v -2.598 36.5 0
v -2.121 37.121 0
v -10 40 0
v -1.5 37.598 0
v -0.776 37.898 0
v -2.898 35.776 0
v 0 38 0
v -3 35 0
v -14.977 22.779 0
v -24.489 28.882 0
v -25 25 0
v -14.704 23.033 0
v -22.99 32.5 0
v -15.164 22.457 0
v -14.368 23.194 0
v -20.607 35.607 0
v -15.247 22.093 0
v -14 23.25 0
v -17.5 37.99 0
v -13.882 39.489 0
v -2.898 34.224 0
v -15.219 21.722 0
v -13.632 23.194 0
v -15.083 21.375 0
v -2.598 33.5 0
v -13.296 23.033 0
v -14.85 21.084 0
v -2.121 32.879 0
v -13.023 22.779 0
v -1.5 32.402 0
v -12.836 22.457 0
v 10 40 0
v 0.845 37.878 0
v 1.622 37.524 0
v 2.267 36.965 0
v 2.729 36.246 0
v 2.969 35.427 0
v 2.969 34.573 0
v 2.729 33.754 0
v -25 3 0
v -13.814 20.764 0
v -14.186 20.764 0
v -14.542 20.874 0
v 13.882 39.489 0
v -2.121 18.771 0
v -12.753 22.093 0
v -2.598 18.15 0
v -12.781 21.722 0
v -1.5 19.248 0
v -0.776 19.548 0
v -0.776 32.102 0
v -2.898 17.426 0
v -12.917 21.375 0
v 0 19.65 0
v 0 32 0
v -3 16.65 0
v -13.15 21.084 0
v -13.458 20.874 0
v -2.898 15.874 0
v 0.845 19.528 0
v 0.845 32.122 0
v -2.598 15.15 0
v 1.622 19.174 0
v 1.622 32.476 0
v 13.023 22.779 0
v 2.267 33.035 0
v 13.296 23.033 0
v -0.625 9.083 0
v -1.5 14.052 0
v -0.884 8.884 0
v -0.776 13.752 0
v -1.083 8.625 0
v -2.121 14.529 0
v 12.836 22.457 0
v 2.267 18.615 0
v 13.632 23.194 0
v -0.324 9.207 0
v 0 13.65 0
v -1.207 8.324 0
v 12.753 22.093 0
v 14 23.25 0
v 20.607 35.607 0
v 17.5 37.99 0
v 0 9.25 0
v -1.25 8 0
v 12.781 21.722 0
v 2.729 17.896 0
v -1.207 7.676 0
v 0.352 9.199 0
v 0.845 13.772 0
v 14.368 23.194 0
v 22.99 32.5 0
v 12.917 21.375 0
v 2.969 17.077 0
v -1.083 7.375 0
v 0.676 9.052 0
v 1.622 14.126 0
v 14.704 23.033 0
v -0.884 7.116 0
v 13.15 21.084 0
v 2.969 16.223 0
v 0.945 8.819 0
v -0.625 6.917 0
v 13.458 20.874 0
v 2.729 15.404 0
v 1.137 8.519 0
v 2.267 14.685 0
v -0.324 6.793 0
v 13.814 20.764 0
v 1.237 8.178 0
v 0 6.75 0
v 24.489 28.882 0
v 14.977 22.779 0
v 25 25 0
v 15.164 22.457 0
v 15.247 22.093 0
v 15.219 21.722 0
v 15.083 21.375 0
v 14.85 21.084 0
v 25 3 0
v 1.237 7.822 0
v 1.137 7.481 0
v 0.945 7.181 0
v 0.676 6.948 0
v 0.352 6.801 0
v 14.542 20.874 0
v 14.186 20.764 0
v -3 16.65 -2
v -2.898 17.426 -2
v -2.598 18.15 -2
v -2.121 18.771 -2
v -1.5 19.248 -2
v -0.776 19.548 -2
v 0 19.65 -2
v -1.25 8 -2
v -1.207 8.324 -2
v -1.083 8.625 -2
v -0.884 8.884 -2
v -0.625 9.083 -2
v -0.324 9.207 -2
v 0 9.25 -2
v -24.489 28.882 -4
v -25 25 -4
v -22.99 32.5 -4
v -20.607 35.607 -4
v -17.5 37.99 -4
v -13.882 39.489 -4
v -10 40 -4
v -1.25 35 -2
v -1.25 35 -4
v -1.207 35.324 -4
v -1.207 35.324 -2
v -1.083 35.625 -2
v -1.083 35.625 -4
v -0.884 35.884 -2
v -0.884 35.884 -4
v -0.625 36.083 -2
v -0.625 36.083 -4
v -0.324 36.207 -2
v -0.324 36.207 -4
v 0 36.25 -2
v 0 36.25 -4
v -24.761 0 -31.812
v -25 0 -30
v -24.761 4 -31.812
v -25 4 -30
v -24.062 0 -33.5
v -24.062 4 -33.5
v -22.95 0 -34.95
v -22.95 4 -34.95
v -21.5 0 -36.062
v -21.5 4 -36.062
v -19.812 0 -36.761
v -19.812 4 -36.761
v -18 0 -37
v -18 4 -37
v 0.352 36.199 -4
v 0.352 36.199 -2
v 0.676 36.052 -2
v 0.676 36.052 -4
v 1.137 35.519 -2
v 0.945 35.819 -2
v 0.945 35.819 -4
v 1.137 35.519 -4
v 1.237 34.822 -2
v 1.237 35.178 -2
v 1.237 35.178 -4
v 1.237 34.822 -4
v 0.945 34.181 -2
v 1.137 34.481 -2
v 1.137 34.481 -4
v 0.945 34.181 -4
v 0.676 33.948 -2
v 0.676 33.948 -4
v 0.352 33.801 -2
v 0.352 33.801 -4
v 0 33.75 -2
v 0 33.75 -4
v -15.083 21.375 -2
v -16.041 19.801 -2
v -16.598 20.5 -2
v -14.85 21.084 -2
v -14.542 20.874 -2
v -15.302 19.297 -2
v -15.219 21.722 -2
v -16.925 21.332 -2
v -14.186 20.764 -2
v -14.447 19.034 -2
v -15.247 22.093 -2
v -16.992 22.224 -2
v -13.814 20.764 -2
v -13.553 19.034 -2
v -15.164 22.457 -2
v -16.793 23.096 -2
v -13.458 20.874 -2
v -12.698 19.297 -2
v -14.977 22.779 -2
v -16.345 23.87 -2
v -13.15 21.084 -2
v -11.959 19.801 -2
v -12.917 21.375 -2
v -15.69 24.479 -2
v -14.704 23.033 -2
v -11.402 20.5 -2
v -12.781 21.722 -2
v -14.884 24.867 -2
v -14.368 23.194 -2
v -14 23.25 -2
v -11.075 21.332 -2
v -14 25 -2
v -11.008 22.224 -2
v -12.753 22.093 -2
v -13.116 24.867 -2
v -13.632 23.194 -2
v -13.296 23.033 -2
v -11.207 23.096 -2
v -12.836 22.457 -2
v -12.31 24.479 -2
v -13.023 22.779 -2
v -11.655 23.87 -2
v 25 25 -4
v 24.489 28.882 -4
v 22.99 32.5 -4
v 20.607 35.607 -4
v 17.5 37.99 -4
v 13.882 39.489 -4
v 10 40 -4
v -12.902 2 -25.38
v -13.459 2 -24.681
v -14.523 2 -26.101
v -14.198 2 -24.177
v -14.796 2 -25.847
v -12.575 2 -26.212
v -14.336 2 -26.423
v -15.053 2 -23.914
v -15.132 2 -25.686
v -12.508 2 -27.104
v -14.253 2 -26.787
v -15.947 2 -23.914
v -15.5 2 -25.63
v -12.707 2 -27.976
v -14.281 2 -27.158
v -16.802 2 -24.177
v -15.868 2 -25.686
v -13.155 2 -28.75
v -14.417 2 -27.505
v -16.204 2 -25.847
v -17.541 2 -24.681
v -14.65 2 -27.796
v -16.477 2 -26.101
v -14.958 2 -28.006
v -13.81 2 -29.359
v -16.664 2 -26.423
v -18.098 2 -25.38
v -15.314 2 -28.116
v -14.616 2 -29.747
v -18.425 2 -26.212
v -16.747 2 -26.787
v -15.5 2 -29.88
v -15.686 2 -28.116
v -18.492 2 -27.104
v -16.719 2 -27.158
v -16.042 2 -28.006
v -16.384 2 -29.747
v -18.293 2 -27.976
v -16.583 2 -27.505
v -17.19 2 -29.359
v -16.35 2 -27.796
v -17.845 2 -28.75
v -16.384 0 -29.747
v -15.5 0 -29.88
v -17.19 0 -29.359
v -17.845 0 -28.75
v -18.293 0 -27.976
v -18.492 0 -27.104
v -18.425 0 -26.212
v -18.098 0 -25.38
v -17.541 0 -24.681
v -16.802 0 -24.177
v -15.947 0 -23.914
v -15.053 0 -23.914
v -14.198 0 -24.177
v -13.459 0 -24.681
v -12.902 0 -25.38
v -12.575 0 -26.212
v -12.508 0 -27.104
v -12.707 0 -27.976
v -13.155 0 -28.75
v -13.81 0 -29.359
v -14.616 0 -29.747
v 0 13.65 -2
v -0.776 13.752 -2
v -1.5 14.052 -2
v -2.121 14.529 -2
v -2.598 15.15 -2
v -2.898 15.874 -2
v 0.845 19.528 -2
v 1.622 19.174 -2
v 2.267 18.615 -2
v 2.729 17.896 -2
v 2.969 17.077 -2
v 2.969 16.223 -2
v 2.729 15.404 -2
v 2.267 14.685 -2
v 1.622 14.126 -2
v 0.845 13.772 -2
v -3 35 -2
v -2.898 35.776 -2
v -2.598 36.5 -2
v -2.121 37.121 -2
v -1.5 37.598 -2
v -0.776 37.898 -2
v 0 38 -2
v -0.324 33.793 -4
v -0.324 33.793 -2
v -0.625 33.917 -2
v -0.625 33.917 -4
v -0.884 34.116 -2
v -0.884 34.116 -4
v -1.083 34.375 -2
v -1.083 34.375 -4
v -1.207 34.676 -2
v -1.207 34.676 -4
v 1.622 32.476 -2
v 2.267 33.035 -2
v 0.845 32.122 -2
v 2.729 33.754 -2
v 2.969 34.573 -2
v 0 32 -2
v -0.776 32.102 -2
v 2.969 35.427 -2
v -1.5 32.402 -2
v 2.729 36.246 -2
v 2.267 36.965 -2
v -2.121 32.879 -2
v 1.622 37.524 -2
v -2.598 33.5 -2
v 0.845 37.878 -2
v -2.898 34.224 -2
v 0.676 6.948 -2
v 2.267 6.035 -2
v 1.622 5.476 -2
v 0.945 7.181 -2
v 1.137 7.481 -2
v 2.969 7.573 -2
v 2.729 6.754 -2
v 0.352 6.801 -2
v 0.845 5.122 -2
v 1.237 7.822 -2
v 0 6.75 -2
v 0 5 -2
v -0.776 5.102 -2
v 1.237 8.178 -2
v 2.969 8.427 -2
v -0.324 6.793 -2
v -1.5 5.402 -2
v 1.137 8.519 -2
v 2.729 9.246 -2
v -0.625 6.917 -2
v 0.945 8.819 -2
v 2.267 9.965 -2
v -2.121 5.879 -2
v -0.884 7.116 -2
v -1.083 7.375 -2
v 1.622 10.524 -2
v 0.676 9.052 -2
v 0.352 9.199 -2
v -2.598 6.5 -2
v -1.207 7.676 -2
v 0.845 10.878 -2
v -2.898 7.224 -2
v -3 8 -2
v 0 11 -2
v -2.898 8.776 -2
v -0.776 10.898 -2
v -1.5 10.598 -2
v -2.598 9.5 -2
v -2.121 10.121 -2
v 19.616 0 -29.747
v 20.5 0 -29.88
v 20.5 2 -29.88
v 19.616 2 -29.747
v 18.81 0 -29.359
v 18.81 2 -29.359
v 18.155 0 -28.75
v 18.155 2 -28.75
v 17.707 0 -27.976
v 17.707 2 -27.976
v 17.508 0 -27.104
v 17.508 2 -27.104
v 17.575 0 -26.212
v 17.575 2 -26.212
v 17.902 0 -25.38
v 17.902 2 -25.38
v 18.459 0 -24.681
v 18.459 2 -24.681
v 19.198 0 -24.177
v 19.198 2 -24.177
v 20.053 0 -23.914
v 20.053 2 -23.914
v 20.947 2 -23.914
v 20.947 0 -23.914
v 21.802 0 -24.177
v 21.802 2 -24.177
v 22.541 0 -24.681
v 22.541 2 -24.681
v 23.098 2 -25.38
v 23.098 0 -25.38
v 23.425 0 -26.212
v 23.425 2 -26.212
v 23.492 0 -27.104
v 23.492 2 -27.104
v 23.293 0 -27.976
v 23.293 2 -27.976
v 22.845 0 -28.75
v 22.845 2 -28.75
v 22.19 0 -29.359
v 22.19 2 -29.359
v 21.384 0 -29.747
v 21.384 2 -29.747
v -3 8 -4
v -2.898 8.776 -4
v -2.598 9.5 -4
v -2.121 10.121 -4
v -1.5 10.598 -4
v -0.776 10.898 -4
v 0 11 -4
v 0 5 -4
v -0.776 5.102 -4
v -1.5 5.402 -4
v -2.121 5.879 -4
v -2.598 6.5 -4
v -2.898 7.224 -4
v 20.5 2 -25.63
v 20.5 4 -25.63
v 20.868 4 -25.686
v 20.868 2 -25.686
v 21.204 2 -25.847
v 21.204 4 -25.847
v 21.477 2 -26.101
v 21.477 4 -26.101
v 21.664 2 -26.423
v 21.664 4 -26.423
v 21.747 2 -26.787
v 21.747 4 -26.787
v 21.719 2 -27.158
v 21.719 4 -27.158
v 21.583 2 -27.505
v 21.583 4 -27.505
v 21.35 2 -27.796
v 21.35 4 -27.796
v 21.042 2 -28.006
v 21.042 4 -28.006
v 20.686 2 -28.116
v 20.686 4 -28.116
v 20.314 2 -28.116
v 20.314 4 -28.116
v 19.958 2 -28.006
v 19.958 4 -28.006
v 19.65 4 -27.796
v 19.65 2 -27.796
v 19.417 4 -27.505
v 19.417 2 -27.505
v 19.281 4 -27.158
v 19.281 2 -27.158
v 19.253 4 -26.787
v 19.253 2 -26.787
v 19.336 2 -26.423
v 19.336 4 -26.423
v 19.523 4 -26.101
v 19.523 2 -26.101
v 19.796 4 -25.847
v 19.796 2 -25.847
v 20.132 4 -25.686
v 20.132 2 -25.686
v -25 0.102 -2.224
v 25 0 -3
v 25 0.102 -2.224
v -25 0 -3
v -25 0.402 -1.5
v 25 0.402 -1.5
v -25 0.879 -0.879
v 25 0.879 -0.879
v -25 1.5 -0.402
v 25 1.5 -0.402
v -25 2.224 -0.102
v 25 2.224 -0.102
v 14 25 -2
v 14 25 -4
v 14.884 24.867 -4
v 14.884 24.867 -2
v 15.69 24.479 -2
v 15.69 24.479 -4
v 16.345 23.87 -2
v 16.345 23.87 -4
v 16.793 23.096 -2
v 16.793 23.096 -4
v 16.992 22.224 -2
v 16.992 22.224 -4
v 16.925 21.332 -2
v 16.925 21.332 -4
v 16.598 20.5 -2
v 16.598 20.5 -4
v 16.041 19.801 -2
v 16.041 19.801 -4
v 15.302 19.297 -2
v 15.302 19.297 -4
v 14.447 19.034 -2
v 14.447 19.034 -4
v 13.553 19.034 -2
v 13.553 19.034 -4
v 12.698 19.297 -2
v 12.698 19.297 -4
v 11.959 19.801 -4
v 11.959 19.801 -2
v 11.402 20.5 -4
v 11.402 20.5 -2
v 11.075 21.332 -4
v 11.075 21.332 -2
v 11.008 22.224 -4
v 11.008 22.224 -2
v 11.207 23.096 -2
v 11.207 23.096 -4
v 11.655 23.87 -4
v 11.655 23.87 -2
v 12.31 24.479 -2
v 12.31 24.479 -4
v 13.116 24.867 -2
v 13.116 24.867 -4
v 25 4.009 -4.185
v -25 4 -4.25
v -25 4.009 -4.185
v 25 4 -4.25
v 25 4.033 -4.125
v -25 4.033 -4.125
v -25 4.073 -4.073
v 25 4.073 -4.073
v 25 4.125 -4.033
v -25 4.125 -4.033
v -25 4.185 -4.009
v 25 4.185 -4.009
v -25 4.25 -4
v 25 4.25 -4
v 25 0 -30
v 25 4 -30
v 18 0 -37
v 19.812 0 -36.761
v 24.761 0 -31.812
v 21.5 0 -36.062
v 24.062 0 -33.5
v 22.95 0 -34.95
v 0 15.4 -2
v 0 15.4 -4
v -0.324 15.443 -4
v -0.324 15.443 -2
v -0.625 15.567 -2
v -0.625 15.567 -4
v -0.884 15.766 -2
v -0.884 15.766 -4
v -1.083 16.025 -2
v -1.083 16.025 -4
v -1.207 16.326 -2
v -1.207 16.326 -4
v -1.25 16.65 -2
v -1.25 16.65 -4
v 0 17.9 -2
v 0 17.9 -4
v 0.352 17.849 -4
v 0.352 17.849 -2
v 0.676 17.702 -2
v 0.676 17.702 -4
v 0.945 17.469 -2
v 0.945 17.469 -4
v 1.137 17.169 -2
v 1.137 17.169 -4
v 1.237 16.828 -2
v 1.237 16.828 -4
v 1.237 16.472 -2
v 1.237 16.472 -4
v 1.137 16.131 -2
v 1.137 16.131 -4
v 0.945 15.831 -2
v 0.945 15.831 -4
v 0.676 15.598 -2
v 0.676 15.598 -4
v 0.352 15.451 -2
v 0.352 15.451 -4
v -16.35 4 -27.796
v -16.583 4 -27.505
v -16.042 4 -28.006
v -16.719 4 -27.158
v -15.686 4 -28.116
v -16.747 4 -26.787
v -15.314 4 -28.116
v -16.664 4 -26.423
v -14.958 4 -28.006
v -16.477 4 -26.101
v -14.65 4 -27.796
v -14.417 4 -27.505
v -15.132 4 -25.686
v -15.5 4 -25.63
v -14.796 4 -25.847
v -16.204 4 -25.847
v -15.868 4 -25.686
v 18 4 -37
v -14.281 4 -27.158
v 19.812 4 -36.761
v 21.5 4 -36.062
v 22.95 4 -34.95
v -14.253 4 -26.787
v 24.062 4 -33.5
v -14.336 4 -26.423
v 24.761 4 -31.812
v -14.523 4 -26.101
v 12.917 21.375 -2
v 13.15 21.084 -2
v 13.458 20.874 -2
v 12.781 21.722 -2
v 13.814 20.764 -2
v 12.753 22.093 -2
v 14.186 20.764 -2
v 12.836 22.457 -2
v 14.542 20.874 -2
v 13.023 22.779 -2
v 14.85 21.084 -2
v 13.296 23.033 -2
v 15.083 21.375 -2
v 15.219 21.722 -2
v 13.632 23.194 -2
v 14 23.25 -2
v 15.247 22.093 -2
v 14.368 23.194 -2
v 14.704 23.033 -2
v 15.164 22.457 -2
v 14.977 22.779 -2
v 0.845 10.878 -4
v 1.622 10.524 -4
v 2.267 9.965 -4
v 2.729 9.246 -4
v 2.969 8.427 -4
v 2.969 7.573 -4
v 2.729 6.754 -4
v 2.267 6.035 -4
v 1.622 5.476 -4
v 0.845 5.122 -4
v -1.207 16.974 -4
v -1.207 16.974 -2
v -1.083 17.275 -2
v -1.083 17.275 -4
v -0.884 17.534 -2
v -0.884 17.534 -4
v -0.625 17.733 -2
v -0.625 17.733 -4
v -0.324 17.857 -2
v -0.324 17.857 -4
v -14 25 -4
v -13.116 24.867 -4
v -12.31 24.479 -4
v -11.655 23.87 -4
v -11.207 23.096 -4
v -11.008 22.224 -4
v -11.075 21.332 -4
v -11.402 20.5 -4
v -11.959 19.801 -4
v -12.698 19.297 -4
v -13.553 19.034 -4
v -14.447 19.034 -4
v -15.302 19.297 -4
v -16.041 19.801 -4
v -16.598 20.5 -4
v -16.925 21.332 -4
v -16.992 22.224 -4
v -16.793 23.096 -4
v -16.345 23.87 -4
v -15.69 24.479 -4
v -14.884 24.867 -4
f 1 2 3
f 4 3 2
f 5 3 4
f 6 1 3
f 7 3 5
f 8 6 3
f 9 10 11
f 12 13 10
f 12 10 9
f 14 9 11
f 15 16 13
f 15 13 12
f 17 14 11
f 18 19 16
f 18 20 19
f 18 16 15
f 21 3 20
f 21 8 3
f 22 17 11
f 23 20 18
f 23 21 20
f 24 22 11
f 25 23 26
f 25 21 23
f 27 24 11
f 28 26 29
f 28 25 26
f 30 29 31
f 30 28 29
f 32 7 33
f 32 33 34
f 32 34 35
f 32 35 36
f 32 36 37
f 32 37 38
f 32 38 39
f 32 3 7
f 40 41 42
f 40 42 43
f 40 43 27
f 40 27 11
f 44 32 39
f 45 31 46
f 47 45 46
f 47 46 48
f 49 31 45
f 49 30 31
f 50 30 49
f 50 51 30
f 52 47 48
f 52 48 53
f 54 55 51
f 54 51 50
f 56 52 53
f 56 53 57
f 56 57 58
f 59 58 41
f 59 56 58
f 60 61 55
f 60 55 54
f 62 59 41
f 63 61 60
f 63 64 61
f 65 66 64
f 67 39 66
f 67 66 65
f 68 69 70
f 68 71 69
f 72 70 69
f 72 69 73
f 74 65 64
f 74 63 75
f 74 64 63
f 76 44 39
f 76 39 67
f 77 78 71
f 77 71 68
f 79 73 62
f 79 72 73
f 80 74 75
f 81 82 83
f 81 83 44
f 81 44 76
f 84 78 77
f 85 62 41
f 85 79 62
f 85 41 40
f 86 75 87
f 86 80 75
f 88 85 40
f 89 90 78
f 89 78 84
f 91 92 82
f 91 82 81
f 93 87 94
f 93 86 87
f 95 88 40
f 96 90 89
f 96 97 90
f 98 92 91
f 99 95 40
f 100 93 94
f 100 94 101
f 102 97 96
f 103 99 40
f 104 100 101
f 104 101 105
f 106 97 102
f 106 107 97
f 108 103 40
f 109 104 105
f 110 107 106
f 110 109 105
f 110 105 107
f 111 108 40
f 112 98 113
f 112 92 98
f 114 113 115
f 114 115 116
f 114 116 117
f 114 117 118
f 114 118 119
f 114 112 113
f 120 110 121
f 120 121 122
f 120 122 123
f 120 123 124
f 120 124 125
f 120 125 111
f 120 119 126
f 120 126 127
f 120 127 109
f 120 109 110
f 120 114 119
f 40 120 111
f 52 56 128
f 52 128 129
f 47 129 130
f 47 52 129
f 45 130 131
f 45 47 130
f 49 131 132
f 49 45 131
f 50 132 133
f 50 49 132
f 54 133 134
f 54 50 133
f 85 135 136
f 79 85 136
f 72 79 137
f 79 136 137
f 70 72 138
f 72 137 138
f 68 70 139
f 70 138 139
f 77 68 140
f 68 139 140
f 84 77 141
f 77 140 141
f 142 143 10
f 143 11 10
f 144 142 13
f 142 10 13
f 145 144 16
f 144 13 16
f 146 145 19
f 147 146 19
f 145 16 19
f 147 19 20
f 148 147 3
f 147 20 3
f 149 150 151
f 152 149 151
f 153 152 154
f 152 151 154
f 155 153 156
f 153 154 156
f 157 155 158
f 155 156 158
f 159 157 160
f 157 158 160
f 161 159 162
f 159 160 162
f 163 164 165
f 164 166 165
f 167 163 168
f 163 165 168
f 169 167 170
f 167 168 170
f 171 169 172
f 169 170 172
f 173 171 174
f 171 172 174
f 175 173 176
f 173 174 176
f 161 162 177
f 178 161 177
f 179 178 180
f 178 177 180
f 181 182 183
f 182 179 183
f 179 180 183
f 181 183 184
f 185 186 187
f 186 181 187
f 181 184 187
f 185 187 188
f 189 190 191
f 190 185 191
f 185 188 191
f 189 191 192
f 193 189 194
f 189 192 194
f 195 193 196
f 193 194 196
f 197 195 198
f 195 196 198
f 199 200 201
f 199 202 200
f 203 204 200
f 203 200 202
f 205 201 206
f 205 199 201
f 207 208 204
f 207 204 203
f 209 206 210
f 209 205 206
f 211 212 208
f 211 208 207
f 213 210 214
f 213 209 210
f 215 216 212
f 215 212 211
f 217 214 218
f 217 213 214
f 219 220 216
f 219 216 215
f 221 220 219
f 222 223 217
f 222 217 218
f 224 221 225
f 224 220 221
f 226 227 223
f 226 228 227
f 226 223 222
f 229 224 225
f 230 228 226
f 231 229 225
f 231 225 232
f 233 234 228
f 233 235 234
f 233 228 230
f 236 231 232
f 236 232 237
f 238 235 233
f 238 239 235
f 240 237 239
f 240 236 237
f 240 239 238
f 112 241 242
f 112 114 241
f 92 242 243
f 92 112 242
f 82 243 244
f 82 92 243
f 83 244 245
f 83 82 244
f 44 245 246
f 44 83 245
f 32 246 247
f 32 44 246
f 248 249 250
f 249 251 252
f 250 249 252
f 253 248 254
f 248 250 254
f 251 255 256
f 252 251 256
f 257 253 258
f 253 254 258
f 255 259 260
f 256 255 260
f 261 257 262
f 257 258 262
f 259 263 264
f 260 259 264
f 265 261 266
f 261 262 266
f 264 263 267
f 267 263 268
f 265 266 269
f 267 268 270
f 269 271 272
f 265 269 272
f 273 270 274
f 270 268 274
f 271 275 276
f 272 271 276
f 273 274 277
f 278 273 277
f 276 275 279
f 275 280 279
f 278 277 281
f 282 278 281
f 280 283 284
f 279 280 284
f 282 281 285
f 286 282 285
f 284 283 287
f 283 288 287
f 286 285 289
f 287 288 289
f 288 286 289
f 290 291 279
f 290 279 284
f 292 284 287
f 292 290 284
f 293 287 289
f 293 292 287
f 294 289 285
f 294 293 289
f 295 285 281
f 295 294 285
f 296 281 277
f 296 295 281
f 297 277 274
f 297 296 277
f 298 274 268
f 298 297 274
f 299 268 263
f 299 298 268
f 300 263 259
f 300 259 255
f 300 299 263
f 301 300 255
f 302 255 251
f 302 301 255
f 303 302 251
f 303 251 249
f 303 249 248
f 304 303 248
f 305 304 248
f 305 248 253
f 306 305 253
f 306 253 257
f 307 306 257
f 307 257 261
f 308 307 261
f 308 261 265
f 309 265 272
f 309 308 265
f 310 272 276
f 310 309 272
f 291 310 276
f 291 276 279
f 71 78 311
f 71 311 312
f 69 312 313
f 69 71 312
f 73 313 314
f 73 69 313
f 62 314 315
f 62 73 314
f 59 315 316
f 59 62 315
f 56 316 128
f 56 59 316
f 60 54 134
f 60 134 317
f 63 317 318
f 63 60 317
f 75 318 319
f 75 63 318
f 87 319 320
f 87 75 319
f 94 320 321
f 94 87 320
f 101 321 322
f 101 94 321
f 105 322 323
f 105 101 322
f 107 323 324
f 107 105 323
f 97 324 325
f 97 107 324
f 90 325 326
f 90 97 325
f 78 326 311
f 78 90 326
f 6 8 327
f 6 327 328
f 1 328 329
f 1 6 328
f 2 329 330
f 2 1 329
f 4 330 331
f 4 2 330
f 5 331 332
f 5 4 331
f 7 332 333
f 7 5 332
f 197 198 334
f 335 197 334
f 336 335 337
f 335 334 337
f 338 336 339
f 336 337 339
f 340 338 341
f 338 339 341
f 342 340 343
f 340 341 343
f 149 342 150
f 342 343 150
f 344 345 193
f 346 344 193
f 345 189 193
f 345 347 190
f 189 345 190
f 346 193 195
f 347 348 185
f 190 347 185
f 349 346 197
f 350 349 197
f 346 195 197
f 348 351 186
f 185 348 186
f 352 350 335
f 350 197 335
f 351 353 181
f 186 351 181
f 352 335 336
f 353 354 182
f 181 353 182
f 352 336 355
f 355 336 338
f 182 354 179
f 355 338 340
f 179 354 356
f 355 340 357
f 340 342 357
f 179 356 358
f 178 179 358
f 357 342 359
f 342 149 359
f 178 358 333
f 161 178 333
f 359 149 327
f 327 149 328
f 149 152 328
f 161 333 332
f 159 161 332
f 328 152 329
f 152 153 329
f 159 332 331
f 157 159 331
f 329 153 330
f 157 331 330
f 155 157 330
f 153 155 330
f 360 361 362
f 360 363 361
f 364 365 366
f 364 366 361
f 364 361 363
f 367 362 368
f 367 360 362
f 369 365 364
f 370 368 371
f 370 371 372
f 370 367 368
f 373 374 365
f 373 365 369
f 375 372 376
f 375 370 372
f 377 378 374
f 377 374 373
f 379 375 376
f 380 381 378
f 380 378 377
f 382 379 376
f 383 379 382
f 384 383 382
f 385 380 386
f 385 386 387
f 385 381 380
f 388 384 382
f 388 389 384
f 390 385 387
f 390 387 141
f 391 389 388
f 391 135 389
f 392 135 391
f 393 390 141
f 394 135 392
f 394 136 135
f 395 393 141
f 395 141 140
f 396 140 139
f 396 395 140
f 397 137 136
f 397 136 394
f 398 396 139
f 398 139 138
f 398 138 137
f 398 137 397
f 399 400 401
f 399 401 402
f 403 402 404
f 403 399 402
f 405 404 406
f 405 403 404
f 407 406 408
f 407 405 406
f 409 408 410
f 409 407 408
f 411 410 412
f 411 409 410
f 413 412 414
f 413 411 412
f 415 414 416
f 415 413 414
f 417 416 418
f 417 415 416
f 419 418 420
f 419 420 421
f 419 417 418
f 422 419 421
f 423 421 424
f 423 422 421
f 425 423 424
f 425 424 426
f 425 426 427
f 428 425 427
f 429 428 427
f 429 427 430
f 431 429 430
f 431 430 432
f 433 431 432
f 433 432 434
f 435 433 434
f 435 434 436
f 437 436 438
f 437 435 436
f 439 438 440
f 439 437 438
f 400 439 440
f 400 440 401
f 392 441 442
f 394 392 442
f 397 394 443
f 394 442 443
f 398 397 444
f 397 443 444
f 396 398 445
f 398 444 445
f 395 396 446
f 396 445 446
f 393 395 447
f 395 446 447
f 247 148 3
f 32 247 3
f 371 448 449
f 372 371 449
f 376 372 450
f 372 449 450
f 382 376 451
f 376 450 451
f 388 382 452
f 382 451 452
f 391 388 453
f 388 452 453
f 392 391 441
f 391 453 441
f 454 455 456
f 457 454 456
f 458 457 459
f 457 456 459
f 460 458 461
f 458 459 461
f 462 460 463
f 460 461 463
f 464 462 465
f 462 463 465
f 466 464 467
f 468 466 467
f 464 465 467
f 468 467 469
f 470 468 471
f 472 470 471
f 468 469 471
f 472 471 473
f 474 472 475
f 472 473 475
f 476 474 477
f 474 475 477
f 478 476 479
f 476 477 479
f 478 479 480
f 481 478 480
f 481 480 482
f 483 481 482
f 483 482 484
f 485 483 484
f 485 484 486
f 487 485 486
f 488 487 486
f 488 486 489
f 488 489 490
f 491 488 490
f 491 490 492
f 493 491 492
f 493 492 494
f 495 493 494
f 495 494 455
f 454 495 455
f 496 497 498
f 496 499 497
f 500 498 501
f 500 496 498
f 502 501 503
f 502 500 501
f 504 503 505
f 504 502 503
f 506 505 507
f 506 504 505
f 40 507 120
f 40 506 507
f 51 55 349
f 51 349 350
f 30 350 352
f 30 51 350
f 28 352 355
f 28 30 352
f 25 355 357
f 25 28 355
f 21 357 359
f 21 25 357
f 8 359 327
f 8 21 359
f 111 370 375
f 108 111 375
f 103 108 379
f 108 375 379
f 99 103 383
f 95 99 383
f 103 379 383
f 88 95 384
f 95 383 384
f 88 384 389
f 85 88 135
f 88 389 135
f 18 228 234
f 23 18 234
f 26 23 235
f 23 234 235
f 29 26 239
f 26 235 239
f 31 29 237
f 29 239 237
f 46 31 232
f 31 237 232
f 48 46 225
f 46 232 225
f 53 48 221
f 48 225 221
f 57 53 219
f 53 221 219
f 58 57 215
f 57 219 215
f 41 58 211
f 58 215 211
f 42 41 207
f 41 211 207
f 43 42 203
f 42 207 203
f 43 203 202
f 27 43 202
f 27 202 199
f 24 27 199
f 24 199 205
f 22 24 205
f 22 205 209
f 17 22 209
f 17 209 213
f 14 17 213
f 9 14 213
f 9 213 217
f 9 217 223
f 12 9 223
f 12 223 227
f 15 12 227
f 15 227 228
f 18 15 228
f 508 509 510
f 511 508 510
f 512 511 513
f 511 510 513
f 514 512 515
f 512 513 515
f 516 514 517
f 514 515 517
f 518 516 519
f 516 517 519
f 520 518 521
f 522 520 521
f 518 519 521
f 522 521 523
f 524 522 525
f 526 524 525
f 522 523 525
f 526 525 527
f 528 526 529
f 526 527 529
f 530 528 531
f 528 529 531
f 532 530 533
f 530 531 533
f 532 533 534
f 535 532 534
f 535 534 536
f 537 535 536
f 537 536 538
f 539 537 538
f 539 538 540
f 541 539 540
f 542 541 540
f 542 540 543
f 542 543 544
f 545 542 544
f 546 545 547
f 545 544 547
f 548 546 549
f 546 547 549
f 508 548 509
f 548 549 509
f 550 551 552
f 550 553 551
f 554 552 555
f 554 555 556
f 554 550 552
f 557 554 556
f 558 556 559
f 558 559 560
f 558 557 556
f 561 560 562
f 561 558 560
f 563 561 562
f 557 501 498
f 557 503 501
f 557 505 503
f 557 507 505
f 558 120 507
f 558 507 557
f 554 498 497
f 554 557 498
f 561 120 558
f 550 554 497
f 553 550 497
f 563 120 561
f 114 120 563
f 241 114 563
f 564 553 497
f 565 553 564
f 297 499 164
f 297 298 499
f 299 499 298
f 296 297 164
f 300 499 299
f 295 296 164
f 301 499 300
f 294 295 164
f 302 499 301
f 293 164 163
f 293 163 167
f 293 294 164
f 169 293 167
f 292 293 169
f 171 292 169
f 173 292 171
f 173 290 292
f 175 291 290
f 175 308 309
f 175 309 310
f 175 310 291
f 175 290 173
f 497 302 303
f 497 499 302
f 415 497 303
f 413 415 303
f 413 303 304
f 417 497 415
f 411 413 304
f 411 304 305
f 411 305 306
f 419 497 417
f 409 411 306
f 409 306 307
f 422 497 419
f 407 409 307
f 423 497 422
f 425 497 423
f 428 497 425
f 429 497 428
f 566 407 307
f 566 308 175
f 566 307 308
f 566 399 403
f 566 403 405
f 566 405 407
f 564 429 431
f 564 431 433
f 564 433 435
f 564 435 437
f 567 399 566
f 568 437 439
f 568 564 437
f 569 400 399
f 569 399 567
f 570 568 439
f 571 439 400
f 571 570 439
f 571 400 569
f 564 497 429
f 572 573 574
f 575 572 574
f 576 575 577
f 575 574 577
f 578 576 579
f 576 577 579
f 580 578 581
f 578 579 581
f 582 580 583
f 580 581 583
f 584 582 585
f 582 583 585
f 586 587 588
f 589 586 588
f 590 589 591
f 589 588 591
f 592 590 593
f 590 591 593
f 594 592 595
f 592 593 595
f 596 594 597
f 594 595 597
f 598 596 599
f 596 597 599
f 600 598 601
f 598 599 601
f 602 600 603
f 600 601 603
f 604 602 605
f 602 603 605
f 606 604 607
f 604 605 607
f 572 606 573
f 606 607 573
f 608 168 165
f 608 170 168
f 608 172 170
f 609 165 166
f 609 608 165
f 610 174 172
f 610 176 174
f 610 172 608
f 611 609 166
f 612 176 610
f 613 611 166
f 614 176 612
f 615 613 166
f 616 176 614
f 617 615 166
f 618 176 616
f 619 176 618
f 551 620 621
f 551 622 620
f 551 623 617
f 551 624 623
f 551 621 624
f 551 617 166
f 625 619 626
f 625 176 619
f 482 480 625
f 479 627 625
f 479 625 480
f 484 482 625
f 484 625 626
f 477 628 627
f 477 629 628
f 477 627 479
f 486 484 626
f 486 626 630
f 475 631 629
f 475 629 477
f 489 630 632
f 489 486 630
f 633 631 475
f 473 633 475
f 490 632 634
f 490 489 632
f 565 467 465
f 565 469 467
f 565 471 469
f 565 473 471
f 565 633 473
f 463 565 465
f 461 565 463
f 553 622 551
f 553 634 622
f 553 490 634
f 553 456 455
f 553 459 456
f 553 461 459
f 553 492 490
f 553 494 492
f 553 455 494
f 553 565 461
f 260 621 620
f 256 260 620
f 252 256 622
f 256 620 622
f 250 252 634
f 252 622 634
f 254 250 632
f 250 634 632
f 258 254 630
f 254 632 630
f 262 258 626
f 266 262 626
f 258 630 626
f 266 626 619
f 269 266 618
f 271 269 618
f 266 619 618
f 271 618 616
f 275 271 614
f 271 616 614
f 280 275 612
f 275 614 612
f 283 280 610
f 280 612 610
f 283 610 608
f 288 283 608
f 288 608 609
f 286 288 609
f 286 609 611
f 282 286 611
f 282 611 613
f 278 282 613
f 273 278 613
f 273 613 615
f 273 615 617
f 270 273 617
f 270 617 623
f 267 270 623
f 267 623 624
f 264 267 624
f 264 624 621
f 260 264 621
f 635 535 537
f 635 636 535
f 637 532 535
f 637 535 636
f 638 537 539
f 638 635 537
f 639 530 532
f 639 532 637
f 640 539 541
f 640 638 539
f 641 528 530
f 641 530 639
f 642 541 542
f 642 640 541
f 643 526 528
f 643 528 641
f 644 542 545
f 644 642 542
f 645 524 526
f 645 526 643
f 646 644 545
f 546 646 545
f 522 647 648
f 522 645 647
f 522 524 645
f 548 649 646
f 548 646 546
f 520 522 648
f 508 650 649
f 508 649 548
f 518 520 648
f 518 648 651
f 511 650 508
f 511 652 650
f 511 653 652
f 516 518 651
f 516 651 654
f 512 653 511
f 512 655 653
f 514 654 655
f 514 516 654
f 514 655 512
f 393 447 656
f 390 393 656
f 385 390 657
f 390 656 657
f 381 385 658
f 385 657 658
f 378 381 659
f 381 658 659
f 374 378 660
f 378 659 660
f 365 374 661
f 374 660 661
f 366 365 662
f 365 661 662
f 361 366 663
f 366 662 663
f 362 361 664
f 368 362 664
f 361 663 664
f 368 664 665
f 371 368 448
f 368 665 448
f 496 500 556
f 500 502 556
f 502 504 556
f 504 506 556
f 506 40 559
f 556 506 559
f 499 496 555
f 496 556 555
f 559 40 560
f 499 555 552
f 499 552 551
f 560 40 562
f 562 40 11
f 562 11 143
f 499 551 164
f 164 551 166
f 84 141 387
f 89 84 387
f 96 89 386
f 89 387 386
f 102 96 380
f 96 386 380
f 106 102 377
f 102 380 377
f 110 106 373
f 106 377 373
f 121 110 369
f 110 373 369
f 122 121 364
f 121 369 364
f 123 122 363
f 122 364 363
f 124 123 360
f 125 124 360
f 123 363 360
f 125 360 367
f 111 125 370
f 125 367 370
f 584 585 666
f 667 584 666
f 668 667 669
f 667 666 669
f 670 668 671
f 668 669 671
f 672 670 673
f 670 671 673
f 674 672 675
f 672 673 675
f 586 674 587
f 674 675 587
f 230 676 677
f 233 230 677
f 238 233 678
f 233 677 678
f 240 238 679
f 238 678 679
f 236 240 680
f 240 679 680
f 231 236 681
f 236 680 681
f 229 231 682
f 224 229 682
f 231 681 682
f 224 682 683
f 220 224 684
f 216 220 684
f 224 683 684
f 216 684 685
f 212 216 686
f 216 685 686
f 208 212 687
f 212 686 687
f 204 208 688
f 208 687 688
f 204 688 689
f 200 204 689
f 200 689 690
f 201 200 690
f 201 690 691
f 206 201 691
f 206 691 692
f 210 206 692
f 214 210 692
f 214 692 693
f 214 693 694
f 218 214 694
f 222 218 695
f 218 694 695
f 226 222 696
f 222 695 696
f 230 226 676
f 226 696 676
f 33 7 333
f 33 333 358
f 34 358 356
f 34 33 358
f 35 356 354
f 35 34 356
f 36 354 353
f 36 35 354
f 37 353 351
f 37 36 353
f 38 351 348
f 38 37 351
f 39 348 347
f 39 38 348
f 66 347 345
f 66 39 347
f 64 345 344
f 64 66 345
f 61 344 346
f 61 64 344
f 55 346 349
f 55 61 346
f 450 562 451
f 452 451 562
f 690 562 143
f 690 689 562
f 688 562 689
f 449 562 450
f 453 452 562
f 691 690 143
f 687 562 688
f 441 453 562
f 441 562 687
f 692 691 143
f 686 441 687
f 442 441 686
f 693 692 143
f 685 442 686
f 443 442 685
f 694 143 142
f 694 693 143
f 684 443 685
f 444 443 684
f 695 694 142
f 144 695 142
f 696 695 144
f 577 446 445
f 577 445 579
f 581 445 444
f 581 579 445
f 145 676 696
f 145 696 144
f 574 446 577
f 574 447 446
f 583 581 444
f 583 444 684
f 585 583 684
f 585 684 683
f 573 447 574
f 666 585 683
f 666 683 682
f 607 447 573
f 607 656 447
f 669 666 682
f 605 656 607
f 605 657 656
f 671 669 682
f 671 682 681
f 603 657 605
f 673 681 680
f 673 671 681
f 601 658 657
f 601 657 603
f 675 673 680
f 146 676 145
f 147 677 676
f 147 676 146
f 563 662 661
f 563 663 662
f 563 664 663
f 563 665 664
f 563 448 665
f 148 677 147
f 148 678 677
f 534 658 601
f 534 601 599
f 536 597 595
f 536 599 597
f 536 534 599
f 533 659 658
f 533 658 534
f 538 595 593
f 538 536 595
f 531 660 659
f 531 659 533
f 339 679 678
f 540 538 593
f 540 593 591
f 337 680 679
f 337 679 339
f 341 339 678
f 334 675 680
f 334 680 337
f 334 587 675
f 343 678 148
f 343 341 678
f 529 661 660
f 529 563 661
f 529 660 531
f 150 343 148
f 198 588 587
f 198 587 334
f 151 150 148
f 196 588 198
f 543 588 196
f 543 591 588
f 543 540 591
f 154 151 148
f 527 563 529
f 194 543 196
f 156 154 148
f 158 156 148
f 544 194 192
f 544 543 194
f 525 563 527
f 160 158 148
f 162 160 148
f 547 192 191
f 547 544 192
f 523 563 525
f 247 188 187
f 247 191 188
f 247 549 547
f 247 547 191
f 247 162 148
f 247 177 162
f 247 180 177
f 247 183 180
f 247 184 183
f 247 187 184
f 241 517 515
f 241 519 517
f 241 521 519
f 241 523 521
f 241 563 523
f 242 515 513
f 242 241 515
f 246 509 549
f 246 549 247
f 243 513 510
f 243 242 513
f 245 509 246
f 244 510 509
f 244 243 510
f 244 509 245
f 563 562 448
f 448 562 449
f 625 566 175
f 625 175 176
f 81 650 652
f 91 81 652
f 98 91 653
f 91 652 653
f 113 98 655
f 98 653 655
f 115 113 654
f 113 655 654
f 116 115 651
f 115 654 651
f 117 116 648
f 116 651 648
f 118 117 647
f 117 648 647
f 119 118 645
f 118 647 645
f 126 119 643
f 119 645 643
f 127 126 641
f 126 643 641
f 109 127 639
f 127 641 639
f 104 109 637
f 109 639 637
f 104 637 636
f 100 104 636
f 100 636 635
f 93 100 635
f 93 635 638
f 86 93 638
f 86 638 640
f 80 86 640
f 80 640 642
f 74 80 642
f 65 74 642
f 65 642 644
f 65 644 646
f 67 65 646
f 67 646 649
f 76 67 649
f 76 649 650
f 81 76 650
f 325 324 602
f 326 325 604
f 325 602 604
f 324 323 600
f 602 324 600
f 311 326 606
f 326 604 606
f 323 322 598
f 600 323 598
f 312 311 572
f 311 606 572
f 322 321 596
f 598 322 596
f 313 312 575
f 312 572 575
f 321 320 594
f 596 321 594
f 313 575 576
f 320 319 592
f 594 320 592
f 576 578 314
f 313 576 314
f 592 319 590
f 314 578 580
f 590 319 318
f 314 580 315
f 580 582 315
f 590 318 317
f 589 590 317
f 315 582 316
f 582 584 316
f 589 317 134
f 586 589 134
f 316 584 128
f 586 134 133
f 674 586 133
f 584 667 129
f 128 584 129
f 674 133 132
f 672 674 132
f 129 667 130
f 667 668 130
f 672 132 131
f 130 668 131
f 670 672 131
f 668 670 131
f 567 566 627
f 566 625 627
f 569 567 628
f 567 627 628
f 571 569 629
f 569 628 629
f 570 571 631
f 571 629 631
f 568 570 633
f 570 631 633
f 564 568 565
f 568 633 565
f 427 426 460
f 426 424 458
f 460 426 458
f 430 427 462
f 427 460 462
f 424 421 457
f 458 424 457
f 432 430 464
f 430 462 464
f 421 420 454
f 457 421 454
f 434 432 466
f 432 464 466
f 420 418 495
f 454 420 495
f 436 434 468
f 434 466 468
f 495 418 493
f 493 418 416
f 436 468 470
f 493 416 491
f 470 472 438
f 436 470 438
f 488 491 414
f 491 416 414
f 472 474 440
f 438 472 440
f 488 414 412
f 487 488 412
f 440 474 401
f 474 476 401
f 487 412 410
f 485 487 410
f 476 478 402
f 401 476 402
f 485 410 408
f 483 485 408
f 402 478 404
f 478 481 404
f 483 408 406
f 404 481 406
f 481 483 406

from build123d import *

# Parameters (mm, degrees)
RESSALTO_EXTRUS_O1_DEPTH = 25
CORTE_EXTRUS_O1_START    = -4
ESBO_O2_R                = 3
ESBO_O2_R_2              = 1.25
CORTE_EXTRUS_O1_DEPTH    = 2
ESBO_O2_5_R              = 1.25
CORTE_EXTRUS_O2_DEPTH    = 58.358521599
ESBO_O2_6_R              = 1.25
CORTE_EXTRUS_O3_DEPTH    = 58.358521599
ESBO_O4_R                = 3
ESBO_O4_R_2              = 1.25
CORTE_EXTRUS_O4_DEPTH    = 2
ESBO_O4_4_R              = 1.25
CORTE_EXTRUS_O5_DEPTH    = 58.567351858
CORTE_EXTRUS_O8_START    = -4
CORTE_EXTRUS_O8_DEPTH    = 2
CORTE_EXTRUS_O9_DEPTH    = 58.567351858
FILETE1_R                = 15
FILETE2_R                = 7
FILETE3_R                = 0.25
FILETE4_R                = 3


with BuildPart() as part:
    # Esboço1 → Ressalto-extrusão1 (new, symmetric)
    with BuildSketch(Plane(origin=(0, 0, 0), x_dir=(0, 0, -1), z_dir=(1, 0, 0))):
        Polygon((0, 0), (37, 0), (37, 4), (4, 4), (4, 40), (0, 40), align=None)
    extrude(amount=RESSALTO_EXTRUS_O1_DEPTH, both=True)

    # Esboço2 → Corte-extrusão1 (cut)
    # profile 1 of 2: a face of its own
    with BuildSketch(Plane(origin=(0, 4, 0), x_dir=(1, 0, 0), z_dir=(0, 1, 0)).offset(CORTE_EXTRUS_O1_START)):
        with Locations(Location((20.5, 26.88, 0), (0, 0, 90))):
            Circle(ESBO_O2_R)
        with Locations(Location((20.5, 26.88, 0), (0, 0, 90))):
            Circle(ESBO_O2_R_2, mode=Mode.SUBTRACT)
    # profile 2 of 2: a face of its own
    with BuildSketch(Plane(origin=(0, 4, 0), x_dir=(1, 0, 0), z_dir=(0, 1, 0)).offset(CORTE_EXTRUS_O1_START)):
        with Locations(Location((-15.5, 26.88, 0), (0, 0, 90))):
            Circle(ESBO_O2_R)
        with Locations(Location((-15.5, 26.88, 0), (0, 0, 90))):
            Circle(ESBO_O2_R_2, mode=Mode.SUBTRACT)
    extrude(amount=CORTE_EXTRUS_O1_DEPTH, mode=Mode.SUBTRACT)

    # Esboço2<5> → Corte-extrusão2 (cut, through all)
    with BuildSketch(Plane(origin=(0, 4, 0), x_dir=(1, 0, 0), z_dir=(0, 1, 0))):
        with Locations(Location((-15.5, 26.88, 0), (0, 0, 270))):
            Circle(ESBO_O2_5_R)
    extrude(amount=-CORTE_EXTRUS_O2_DEPTH, mode=Mode.SUBTRACT)

    # Esboço2<6> → Corte-extrusão3 (cut, through all)
    with BuildSketch(Plane(origin=(0, 4, 0), x_dir=(1, 0, 0), z_dir=(0, 1, 0))):
        with Locations(Location((20.5, 26.88, 0), (0, 0, 270))):
            Circle(ESBO_O2_6_R)
    extrude(amount=-CORTE_EXTRUS_O3_DEPTH, mode=Mode.SUBTRACT)

    # Esboço4 → Corte-extrusão4 (cut)
    # profile 1 of 6: a face of its own
    with BuildSketch(Plane(origin=(0, 0, -4), x_dir=(-1, 0, 0), z_dir=(0, 0, -1))):
        with Locations(Location((14, 22, 0), (0, 0, 90))):
            Circle(ESBO_O4_R)
        with Locations(Location((14, 22, 0), (0, 0, 90))):
            Circle(ESBO_O4_R_2, mode=Mode.SUBTRACT)
    # profile 2 of 6: a face of its own
    with BuildSketch(Plane(origin=(0, 0, -4), x_dir=(-1, 0, 0), z_dir=(0, 0, -1))):
        with Locations(Location((-14, 22, 0), (0, 0, 90))):
            Circle(ESBO_O4_R)
        with Locations(Location((-14, 22, 0), (0, 0, 90))):
            Circle(ESBO_O4_R_2, mode=Mode.SUBTRACT)
    # profile 3 of 6: a face of its own
    with BuildSketch(Plane(origin=(0, 0, -4), x_dir=(-1, 0, 0), z_dir=(0, 0, -1))):
        with BuildLine():
            ThreePointArc((3, 8), (2.121320344, 10.121320344), (0, 11))
            Line((0, 11), (0, 9.25))
            ThreePointArc((0, 9.25), (0.883883476, 8.883883476), (1.25, 8))
            ThreePointArc((1.25, 8), (0.883883476, 7.116116524), (0, 6.75))
            Line((0, 6.75), (0, 5))
            ThreePointArc((0, 5), (2.121320344, 5.878679656), (3, 8))
        make_face()
    # profile 4 of 6: a face of its own
    with BuildSketch(Plane(origin=(0, 0, -4), x_dir=(-1, 0, 0), z_dir=(0, 0, -1))):
        with BuildLine():
            Line((0, 9.25), (0, 11))
            ThreePointArc((0, 11), (-3, 8), (0, 5))
            Line((0, 5), (0, 6.75))
            ThreePointArc((0, 6.75), (-1.25, 8), (0, 9.25))
        make_face()
    # profile 5 of 6: a face of its own
    with BuildSketch(Plane(origin=(0, 0, -4), x_dir=(-1, 0, 0), z_dir=(0, 0, -1))):
        with BuildLine():
            ThreePointArc((3, 8), (2.121320344, 10.121320344), (0, 11))
            Line((0, 11), (0, 9.25))
            ThreePointArc((0, 9.25), (0.883883476, 8.883883476), (1.25, 8))
            ThreePointArc((1.25, 8), (0.883883476, 7.116116524), (0, 6.75))
            Line((0, 6.75), (0, 5))
            ThreePointArc((0, 5), (2.121320344, 5.878679656), (3, 8))
        make_face()
    # profile 6 of 6: a face of its own
    with BuildSketch(Plane(origin=(0, 0, -4), x_dir=(-1, 0, 0), z_dir=(0, 0, -1))):
        with BuildLine():
            Line((0, 9.25), (0, 11))
            ThreePointArc((0, 11), (-3, 8), (0, 5))
            Line((0, 5), (0, 6.75))
            ThreePointArc((0, 6.75), (-1.25, 8), (0, 9.25))
        make_face()
    extrude(amount=-CORTE_EXTRUS_O4_DEPTH, mode=Mode.SUBTRACT)

    # Esboço4<4> → Corte-extrusão5 (cut, through all)
    with BuildSketch(Plane(origin=(0, 0, -4), x_dir=(-1, 0, 0), z_dir=(0, 0, -1))):
        with Locations(Location((-14, 22, 0), (0, 0, 90))):
            Circle(ESBO_O4_4_R)
        with Locations(Location((14, 22, 0), (0, 0, 90))):
            Circle(ESBO_O4_4_R)
        with BuildLine():
            ThreePointArc((1.25, 8), (0.883883476, 8.883883476), (0, 9.25))
            Line((0, 9.25), (0, 6.75))
            ThreePointArc((0, 6.75), (0.883883476, 7.116116524), (1.25, 8))
        make_face()
        with BuildLine():
            Line((0, 6.75), (0, 9.25))
            ThreePointArc((0, 9.25), (-1.25, 8), (0, 6.75))
        make_face()
    extrude(amount=-CORTE_EXTRUS_O5_DEPTH, mode=Mode.SUBTRACT)

    # Esboço4<11> → Corte-extrusão8 (cut)
    with BuildSketch(Plane(origin=(0, 0, -4), x_dir=(-1, 0, 0), z_dir=(0, 0, -1)).offset(CORTE_EXTRUS_O8_START)):
        with BuildLine():
            ThreePointArc((3, 16.65), (2.121320344, 18.771320344), (0, 19.65))
            Line((0, 19.65), (0, 17.9))
            ThreePointArc((0, 17.9), (0.883883476, 17.533883476), (1.25, 16.65))
            ThreePointArc((1.25, 16.65), (0.883883476, 15.766116524), (0, 15.4))
            Line((0, 15.4), (0, 13.65))
            ThreePointArc((0, 13.65), (2.121320344, 14.528679656), (3, 16.65))
        make_face()
        with BuildLine():
            Line((0, 17.9), (0, 19.65))
            ThreePointArc((0, 19.65), (-3, 16.65), (0, 13.65))
            Line((0, 13.65), (0, 15.4))
            ThreePointArc((0, 15.4), (-1.25, 16.65), (0, 17.9))
        make_face()
        with BuildLine():
            ThreePointArc((3, 35), (2.121320344, 37.121320344), (0, 38))
            Line((0, 38), (0, 36.25))
            ThreePointArc((0, 36.25), (0.883883476, 35.883883476), (1.25, 35))
            ThreePointArc((1.25, 35), (0.883883476, 34.116116524), (0, 33.75))
            Line((0, 33.75), (0, 32))
            ThreePointArc((0, 32), (2.121320344, 32.878679656), (3, 35))
        make_face()
        with BuildLine():
            Line((0, 36.25), (0, 38))
            ThreePointArc((0, 38), (-3, 35), (0, 32))
            Line((0, 32), (0, 33.75))
            ThreePointArc((0, 33.75), (-1.25, 35), (0, 36.25))
        make_face()
    extrude(amount=CORTE_EXTRUS_O8_DEPTH, mode=Mode.SUBTRACT)

    # Esboço4<12> → Corte-extrusão9 (cut, through all)
    with BuildSketch(Plane(origin=(0, 0, -4), x_dir=(-1, 0, 0), z_dir=(0, 0, -1))):
        with BuildLine():
            ThreePointArc((1.25, 35), (0.883883476, 35.883883476), (0, 36.25))
            Line((0, 36.25), (0, 33.75))
            ThreePointArc((0, 33.75), (0.883883476, 34.116116524), (1.25, 35))
        make_face()
        with BuildLine():
            Line((0, 33.75), (0, 36.25))
            ThreePointArc((0, 36.25), (-1.25, 35), (0, 33.75))
        make_face()
        with BuildLine():
            ThreePointArc((1.25, 16.65), (0.883883476, 17.533883476), (0, 17.9))
            Line((0, 17.9), (0, 15.4))
            ThreePointArc((0, 15.4), (0.883883476, 15.766116524), (1.25, 16.65))
        make_face()
        with BuildLine():
            Line((0, 15.4), (0, 17.9))
            ThreePointArc((0, 17.9), (-1.25, 16.65), (0, 15.4))
        make_face()
    extrude(amount=-CORTE_EXTRUS_O9_DEPTH, mode=Mode.SUBTRACT)

    # Filete1
    filete1_edges = [part.edges().sort_by_distance(p)[0] for p in [
        (25, 40, -2),
        (-25, 40, -2),
    ]]
    fillet(filete1_edges, radius=FILETE1_R)

    # Filete2
    filete2_edges = [part.edges().sort_by_distance(p)[0] for p in [
        (25, 2, -37),
        (-25, 2, -37),
    ]]
    fillet(filete2_edges, radius=FILETE2_R)

    # Filete3
    filete3_edges = [part.edges().sort_by_distance(p)[0] for p in [
        (0, 4, -4),
    ]]
    fillet(filete3_edges, radius=FILETE3_R)

    # Filete4
    filete4_edges = [part.edges().sort_by_distance(p)[0] for p in [
        (0, 0, 0),
    ]]
    fillet(filete4_edges, radius=FILETE4_R)


solid = part.part
